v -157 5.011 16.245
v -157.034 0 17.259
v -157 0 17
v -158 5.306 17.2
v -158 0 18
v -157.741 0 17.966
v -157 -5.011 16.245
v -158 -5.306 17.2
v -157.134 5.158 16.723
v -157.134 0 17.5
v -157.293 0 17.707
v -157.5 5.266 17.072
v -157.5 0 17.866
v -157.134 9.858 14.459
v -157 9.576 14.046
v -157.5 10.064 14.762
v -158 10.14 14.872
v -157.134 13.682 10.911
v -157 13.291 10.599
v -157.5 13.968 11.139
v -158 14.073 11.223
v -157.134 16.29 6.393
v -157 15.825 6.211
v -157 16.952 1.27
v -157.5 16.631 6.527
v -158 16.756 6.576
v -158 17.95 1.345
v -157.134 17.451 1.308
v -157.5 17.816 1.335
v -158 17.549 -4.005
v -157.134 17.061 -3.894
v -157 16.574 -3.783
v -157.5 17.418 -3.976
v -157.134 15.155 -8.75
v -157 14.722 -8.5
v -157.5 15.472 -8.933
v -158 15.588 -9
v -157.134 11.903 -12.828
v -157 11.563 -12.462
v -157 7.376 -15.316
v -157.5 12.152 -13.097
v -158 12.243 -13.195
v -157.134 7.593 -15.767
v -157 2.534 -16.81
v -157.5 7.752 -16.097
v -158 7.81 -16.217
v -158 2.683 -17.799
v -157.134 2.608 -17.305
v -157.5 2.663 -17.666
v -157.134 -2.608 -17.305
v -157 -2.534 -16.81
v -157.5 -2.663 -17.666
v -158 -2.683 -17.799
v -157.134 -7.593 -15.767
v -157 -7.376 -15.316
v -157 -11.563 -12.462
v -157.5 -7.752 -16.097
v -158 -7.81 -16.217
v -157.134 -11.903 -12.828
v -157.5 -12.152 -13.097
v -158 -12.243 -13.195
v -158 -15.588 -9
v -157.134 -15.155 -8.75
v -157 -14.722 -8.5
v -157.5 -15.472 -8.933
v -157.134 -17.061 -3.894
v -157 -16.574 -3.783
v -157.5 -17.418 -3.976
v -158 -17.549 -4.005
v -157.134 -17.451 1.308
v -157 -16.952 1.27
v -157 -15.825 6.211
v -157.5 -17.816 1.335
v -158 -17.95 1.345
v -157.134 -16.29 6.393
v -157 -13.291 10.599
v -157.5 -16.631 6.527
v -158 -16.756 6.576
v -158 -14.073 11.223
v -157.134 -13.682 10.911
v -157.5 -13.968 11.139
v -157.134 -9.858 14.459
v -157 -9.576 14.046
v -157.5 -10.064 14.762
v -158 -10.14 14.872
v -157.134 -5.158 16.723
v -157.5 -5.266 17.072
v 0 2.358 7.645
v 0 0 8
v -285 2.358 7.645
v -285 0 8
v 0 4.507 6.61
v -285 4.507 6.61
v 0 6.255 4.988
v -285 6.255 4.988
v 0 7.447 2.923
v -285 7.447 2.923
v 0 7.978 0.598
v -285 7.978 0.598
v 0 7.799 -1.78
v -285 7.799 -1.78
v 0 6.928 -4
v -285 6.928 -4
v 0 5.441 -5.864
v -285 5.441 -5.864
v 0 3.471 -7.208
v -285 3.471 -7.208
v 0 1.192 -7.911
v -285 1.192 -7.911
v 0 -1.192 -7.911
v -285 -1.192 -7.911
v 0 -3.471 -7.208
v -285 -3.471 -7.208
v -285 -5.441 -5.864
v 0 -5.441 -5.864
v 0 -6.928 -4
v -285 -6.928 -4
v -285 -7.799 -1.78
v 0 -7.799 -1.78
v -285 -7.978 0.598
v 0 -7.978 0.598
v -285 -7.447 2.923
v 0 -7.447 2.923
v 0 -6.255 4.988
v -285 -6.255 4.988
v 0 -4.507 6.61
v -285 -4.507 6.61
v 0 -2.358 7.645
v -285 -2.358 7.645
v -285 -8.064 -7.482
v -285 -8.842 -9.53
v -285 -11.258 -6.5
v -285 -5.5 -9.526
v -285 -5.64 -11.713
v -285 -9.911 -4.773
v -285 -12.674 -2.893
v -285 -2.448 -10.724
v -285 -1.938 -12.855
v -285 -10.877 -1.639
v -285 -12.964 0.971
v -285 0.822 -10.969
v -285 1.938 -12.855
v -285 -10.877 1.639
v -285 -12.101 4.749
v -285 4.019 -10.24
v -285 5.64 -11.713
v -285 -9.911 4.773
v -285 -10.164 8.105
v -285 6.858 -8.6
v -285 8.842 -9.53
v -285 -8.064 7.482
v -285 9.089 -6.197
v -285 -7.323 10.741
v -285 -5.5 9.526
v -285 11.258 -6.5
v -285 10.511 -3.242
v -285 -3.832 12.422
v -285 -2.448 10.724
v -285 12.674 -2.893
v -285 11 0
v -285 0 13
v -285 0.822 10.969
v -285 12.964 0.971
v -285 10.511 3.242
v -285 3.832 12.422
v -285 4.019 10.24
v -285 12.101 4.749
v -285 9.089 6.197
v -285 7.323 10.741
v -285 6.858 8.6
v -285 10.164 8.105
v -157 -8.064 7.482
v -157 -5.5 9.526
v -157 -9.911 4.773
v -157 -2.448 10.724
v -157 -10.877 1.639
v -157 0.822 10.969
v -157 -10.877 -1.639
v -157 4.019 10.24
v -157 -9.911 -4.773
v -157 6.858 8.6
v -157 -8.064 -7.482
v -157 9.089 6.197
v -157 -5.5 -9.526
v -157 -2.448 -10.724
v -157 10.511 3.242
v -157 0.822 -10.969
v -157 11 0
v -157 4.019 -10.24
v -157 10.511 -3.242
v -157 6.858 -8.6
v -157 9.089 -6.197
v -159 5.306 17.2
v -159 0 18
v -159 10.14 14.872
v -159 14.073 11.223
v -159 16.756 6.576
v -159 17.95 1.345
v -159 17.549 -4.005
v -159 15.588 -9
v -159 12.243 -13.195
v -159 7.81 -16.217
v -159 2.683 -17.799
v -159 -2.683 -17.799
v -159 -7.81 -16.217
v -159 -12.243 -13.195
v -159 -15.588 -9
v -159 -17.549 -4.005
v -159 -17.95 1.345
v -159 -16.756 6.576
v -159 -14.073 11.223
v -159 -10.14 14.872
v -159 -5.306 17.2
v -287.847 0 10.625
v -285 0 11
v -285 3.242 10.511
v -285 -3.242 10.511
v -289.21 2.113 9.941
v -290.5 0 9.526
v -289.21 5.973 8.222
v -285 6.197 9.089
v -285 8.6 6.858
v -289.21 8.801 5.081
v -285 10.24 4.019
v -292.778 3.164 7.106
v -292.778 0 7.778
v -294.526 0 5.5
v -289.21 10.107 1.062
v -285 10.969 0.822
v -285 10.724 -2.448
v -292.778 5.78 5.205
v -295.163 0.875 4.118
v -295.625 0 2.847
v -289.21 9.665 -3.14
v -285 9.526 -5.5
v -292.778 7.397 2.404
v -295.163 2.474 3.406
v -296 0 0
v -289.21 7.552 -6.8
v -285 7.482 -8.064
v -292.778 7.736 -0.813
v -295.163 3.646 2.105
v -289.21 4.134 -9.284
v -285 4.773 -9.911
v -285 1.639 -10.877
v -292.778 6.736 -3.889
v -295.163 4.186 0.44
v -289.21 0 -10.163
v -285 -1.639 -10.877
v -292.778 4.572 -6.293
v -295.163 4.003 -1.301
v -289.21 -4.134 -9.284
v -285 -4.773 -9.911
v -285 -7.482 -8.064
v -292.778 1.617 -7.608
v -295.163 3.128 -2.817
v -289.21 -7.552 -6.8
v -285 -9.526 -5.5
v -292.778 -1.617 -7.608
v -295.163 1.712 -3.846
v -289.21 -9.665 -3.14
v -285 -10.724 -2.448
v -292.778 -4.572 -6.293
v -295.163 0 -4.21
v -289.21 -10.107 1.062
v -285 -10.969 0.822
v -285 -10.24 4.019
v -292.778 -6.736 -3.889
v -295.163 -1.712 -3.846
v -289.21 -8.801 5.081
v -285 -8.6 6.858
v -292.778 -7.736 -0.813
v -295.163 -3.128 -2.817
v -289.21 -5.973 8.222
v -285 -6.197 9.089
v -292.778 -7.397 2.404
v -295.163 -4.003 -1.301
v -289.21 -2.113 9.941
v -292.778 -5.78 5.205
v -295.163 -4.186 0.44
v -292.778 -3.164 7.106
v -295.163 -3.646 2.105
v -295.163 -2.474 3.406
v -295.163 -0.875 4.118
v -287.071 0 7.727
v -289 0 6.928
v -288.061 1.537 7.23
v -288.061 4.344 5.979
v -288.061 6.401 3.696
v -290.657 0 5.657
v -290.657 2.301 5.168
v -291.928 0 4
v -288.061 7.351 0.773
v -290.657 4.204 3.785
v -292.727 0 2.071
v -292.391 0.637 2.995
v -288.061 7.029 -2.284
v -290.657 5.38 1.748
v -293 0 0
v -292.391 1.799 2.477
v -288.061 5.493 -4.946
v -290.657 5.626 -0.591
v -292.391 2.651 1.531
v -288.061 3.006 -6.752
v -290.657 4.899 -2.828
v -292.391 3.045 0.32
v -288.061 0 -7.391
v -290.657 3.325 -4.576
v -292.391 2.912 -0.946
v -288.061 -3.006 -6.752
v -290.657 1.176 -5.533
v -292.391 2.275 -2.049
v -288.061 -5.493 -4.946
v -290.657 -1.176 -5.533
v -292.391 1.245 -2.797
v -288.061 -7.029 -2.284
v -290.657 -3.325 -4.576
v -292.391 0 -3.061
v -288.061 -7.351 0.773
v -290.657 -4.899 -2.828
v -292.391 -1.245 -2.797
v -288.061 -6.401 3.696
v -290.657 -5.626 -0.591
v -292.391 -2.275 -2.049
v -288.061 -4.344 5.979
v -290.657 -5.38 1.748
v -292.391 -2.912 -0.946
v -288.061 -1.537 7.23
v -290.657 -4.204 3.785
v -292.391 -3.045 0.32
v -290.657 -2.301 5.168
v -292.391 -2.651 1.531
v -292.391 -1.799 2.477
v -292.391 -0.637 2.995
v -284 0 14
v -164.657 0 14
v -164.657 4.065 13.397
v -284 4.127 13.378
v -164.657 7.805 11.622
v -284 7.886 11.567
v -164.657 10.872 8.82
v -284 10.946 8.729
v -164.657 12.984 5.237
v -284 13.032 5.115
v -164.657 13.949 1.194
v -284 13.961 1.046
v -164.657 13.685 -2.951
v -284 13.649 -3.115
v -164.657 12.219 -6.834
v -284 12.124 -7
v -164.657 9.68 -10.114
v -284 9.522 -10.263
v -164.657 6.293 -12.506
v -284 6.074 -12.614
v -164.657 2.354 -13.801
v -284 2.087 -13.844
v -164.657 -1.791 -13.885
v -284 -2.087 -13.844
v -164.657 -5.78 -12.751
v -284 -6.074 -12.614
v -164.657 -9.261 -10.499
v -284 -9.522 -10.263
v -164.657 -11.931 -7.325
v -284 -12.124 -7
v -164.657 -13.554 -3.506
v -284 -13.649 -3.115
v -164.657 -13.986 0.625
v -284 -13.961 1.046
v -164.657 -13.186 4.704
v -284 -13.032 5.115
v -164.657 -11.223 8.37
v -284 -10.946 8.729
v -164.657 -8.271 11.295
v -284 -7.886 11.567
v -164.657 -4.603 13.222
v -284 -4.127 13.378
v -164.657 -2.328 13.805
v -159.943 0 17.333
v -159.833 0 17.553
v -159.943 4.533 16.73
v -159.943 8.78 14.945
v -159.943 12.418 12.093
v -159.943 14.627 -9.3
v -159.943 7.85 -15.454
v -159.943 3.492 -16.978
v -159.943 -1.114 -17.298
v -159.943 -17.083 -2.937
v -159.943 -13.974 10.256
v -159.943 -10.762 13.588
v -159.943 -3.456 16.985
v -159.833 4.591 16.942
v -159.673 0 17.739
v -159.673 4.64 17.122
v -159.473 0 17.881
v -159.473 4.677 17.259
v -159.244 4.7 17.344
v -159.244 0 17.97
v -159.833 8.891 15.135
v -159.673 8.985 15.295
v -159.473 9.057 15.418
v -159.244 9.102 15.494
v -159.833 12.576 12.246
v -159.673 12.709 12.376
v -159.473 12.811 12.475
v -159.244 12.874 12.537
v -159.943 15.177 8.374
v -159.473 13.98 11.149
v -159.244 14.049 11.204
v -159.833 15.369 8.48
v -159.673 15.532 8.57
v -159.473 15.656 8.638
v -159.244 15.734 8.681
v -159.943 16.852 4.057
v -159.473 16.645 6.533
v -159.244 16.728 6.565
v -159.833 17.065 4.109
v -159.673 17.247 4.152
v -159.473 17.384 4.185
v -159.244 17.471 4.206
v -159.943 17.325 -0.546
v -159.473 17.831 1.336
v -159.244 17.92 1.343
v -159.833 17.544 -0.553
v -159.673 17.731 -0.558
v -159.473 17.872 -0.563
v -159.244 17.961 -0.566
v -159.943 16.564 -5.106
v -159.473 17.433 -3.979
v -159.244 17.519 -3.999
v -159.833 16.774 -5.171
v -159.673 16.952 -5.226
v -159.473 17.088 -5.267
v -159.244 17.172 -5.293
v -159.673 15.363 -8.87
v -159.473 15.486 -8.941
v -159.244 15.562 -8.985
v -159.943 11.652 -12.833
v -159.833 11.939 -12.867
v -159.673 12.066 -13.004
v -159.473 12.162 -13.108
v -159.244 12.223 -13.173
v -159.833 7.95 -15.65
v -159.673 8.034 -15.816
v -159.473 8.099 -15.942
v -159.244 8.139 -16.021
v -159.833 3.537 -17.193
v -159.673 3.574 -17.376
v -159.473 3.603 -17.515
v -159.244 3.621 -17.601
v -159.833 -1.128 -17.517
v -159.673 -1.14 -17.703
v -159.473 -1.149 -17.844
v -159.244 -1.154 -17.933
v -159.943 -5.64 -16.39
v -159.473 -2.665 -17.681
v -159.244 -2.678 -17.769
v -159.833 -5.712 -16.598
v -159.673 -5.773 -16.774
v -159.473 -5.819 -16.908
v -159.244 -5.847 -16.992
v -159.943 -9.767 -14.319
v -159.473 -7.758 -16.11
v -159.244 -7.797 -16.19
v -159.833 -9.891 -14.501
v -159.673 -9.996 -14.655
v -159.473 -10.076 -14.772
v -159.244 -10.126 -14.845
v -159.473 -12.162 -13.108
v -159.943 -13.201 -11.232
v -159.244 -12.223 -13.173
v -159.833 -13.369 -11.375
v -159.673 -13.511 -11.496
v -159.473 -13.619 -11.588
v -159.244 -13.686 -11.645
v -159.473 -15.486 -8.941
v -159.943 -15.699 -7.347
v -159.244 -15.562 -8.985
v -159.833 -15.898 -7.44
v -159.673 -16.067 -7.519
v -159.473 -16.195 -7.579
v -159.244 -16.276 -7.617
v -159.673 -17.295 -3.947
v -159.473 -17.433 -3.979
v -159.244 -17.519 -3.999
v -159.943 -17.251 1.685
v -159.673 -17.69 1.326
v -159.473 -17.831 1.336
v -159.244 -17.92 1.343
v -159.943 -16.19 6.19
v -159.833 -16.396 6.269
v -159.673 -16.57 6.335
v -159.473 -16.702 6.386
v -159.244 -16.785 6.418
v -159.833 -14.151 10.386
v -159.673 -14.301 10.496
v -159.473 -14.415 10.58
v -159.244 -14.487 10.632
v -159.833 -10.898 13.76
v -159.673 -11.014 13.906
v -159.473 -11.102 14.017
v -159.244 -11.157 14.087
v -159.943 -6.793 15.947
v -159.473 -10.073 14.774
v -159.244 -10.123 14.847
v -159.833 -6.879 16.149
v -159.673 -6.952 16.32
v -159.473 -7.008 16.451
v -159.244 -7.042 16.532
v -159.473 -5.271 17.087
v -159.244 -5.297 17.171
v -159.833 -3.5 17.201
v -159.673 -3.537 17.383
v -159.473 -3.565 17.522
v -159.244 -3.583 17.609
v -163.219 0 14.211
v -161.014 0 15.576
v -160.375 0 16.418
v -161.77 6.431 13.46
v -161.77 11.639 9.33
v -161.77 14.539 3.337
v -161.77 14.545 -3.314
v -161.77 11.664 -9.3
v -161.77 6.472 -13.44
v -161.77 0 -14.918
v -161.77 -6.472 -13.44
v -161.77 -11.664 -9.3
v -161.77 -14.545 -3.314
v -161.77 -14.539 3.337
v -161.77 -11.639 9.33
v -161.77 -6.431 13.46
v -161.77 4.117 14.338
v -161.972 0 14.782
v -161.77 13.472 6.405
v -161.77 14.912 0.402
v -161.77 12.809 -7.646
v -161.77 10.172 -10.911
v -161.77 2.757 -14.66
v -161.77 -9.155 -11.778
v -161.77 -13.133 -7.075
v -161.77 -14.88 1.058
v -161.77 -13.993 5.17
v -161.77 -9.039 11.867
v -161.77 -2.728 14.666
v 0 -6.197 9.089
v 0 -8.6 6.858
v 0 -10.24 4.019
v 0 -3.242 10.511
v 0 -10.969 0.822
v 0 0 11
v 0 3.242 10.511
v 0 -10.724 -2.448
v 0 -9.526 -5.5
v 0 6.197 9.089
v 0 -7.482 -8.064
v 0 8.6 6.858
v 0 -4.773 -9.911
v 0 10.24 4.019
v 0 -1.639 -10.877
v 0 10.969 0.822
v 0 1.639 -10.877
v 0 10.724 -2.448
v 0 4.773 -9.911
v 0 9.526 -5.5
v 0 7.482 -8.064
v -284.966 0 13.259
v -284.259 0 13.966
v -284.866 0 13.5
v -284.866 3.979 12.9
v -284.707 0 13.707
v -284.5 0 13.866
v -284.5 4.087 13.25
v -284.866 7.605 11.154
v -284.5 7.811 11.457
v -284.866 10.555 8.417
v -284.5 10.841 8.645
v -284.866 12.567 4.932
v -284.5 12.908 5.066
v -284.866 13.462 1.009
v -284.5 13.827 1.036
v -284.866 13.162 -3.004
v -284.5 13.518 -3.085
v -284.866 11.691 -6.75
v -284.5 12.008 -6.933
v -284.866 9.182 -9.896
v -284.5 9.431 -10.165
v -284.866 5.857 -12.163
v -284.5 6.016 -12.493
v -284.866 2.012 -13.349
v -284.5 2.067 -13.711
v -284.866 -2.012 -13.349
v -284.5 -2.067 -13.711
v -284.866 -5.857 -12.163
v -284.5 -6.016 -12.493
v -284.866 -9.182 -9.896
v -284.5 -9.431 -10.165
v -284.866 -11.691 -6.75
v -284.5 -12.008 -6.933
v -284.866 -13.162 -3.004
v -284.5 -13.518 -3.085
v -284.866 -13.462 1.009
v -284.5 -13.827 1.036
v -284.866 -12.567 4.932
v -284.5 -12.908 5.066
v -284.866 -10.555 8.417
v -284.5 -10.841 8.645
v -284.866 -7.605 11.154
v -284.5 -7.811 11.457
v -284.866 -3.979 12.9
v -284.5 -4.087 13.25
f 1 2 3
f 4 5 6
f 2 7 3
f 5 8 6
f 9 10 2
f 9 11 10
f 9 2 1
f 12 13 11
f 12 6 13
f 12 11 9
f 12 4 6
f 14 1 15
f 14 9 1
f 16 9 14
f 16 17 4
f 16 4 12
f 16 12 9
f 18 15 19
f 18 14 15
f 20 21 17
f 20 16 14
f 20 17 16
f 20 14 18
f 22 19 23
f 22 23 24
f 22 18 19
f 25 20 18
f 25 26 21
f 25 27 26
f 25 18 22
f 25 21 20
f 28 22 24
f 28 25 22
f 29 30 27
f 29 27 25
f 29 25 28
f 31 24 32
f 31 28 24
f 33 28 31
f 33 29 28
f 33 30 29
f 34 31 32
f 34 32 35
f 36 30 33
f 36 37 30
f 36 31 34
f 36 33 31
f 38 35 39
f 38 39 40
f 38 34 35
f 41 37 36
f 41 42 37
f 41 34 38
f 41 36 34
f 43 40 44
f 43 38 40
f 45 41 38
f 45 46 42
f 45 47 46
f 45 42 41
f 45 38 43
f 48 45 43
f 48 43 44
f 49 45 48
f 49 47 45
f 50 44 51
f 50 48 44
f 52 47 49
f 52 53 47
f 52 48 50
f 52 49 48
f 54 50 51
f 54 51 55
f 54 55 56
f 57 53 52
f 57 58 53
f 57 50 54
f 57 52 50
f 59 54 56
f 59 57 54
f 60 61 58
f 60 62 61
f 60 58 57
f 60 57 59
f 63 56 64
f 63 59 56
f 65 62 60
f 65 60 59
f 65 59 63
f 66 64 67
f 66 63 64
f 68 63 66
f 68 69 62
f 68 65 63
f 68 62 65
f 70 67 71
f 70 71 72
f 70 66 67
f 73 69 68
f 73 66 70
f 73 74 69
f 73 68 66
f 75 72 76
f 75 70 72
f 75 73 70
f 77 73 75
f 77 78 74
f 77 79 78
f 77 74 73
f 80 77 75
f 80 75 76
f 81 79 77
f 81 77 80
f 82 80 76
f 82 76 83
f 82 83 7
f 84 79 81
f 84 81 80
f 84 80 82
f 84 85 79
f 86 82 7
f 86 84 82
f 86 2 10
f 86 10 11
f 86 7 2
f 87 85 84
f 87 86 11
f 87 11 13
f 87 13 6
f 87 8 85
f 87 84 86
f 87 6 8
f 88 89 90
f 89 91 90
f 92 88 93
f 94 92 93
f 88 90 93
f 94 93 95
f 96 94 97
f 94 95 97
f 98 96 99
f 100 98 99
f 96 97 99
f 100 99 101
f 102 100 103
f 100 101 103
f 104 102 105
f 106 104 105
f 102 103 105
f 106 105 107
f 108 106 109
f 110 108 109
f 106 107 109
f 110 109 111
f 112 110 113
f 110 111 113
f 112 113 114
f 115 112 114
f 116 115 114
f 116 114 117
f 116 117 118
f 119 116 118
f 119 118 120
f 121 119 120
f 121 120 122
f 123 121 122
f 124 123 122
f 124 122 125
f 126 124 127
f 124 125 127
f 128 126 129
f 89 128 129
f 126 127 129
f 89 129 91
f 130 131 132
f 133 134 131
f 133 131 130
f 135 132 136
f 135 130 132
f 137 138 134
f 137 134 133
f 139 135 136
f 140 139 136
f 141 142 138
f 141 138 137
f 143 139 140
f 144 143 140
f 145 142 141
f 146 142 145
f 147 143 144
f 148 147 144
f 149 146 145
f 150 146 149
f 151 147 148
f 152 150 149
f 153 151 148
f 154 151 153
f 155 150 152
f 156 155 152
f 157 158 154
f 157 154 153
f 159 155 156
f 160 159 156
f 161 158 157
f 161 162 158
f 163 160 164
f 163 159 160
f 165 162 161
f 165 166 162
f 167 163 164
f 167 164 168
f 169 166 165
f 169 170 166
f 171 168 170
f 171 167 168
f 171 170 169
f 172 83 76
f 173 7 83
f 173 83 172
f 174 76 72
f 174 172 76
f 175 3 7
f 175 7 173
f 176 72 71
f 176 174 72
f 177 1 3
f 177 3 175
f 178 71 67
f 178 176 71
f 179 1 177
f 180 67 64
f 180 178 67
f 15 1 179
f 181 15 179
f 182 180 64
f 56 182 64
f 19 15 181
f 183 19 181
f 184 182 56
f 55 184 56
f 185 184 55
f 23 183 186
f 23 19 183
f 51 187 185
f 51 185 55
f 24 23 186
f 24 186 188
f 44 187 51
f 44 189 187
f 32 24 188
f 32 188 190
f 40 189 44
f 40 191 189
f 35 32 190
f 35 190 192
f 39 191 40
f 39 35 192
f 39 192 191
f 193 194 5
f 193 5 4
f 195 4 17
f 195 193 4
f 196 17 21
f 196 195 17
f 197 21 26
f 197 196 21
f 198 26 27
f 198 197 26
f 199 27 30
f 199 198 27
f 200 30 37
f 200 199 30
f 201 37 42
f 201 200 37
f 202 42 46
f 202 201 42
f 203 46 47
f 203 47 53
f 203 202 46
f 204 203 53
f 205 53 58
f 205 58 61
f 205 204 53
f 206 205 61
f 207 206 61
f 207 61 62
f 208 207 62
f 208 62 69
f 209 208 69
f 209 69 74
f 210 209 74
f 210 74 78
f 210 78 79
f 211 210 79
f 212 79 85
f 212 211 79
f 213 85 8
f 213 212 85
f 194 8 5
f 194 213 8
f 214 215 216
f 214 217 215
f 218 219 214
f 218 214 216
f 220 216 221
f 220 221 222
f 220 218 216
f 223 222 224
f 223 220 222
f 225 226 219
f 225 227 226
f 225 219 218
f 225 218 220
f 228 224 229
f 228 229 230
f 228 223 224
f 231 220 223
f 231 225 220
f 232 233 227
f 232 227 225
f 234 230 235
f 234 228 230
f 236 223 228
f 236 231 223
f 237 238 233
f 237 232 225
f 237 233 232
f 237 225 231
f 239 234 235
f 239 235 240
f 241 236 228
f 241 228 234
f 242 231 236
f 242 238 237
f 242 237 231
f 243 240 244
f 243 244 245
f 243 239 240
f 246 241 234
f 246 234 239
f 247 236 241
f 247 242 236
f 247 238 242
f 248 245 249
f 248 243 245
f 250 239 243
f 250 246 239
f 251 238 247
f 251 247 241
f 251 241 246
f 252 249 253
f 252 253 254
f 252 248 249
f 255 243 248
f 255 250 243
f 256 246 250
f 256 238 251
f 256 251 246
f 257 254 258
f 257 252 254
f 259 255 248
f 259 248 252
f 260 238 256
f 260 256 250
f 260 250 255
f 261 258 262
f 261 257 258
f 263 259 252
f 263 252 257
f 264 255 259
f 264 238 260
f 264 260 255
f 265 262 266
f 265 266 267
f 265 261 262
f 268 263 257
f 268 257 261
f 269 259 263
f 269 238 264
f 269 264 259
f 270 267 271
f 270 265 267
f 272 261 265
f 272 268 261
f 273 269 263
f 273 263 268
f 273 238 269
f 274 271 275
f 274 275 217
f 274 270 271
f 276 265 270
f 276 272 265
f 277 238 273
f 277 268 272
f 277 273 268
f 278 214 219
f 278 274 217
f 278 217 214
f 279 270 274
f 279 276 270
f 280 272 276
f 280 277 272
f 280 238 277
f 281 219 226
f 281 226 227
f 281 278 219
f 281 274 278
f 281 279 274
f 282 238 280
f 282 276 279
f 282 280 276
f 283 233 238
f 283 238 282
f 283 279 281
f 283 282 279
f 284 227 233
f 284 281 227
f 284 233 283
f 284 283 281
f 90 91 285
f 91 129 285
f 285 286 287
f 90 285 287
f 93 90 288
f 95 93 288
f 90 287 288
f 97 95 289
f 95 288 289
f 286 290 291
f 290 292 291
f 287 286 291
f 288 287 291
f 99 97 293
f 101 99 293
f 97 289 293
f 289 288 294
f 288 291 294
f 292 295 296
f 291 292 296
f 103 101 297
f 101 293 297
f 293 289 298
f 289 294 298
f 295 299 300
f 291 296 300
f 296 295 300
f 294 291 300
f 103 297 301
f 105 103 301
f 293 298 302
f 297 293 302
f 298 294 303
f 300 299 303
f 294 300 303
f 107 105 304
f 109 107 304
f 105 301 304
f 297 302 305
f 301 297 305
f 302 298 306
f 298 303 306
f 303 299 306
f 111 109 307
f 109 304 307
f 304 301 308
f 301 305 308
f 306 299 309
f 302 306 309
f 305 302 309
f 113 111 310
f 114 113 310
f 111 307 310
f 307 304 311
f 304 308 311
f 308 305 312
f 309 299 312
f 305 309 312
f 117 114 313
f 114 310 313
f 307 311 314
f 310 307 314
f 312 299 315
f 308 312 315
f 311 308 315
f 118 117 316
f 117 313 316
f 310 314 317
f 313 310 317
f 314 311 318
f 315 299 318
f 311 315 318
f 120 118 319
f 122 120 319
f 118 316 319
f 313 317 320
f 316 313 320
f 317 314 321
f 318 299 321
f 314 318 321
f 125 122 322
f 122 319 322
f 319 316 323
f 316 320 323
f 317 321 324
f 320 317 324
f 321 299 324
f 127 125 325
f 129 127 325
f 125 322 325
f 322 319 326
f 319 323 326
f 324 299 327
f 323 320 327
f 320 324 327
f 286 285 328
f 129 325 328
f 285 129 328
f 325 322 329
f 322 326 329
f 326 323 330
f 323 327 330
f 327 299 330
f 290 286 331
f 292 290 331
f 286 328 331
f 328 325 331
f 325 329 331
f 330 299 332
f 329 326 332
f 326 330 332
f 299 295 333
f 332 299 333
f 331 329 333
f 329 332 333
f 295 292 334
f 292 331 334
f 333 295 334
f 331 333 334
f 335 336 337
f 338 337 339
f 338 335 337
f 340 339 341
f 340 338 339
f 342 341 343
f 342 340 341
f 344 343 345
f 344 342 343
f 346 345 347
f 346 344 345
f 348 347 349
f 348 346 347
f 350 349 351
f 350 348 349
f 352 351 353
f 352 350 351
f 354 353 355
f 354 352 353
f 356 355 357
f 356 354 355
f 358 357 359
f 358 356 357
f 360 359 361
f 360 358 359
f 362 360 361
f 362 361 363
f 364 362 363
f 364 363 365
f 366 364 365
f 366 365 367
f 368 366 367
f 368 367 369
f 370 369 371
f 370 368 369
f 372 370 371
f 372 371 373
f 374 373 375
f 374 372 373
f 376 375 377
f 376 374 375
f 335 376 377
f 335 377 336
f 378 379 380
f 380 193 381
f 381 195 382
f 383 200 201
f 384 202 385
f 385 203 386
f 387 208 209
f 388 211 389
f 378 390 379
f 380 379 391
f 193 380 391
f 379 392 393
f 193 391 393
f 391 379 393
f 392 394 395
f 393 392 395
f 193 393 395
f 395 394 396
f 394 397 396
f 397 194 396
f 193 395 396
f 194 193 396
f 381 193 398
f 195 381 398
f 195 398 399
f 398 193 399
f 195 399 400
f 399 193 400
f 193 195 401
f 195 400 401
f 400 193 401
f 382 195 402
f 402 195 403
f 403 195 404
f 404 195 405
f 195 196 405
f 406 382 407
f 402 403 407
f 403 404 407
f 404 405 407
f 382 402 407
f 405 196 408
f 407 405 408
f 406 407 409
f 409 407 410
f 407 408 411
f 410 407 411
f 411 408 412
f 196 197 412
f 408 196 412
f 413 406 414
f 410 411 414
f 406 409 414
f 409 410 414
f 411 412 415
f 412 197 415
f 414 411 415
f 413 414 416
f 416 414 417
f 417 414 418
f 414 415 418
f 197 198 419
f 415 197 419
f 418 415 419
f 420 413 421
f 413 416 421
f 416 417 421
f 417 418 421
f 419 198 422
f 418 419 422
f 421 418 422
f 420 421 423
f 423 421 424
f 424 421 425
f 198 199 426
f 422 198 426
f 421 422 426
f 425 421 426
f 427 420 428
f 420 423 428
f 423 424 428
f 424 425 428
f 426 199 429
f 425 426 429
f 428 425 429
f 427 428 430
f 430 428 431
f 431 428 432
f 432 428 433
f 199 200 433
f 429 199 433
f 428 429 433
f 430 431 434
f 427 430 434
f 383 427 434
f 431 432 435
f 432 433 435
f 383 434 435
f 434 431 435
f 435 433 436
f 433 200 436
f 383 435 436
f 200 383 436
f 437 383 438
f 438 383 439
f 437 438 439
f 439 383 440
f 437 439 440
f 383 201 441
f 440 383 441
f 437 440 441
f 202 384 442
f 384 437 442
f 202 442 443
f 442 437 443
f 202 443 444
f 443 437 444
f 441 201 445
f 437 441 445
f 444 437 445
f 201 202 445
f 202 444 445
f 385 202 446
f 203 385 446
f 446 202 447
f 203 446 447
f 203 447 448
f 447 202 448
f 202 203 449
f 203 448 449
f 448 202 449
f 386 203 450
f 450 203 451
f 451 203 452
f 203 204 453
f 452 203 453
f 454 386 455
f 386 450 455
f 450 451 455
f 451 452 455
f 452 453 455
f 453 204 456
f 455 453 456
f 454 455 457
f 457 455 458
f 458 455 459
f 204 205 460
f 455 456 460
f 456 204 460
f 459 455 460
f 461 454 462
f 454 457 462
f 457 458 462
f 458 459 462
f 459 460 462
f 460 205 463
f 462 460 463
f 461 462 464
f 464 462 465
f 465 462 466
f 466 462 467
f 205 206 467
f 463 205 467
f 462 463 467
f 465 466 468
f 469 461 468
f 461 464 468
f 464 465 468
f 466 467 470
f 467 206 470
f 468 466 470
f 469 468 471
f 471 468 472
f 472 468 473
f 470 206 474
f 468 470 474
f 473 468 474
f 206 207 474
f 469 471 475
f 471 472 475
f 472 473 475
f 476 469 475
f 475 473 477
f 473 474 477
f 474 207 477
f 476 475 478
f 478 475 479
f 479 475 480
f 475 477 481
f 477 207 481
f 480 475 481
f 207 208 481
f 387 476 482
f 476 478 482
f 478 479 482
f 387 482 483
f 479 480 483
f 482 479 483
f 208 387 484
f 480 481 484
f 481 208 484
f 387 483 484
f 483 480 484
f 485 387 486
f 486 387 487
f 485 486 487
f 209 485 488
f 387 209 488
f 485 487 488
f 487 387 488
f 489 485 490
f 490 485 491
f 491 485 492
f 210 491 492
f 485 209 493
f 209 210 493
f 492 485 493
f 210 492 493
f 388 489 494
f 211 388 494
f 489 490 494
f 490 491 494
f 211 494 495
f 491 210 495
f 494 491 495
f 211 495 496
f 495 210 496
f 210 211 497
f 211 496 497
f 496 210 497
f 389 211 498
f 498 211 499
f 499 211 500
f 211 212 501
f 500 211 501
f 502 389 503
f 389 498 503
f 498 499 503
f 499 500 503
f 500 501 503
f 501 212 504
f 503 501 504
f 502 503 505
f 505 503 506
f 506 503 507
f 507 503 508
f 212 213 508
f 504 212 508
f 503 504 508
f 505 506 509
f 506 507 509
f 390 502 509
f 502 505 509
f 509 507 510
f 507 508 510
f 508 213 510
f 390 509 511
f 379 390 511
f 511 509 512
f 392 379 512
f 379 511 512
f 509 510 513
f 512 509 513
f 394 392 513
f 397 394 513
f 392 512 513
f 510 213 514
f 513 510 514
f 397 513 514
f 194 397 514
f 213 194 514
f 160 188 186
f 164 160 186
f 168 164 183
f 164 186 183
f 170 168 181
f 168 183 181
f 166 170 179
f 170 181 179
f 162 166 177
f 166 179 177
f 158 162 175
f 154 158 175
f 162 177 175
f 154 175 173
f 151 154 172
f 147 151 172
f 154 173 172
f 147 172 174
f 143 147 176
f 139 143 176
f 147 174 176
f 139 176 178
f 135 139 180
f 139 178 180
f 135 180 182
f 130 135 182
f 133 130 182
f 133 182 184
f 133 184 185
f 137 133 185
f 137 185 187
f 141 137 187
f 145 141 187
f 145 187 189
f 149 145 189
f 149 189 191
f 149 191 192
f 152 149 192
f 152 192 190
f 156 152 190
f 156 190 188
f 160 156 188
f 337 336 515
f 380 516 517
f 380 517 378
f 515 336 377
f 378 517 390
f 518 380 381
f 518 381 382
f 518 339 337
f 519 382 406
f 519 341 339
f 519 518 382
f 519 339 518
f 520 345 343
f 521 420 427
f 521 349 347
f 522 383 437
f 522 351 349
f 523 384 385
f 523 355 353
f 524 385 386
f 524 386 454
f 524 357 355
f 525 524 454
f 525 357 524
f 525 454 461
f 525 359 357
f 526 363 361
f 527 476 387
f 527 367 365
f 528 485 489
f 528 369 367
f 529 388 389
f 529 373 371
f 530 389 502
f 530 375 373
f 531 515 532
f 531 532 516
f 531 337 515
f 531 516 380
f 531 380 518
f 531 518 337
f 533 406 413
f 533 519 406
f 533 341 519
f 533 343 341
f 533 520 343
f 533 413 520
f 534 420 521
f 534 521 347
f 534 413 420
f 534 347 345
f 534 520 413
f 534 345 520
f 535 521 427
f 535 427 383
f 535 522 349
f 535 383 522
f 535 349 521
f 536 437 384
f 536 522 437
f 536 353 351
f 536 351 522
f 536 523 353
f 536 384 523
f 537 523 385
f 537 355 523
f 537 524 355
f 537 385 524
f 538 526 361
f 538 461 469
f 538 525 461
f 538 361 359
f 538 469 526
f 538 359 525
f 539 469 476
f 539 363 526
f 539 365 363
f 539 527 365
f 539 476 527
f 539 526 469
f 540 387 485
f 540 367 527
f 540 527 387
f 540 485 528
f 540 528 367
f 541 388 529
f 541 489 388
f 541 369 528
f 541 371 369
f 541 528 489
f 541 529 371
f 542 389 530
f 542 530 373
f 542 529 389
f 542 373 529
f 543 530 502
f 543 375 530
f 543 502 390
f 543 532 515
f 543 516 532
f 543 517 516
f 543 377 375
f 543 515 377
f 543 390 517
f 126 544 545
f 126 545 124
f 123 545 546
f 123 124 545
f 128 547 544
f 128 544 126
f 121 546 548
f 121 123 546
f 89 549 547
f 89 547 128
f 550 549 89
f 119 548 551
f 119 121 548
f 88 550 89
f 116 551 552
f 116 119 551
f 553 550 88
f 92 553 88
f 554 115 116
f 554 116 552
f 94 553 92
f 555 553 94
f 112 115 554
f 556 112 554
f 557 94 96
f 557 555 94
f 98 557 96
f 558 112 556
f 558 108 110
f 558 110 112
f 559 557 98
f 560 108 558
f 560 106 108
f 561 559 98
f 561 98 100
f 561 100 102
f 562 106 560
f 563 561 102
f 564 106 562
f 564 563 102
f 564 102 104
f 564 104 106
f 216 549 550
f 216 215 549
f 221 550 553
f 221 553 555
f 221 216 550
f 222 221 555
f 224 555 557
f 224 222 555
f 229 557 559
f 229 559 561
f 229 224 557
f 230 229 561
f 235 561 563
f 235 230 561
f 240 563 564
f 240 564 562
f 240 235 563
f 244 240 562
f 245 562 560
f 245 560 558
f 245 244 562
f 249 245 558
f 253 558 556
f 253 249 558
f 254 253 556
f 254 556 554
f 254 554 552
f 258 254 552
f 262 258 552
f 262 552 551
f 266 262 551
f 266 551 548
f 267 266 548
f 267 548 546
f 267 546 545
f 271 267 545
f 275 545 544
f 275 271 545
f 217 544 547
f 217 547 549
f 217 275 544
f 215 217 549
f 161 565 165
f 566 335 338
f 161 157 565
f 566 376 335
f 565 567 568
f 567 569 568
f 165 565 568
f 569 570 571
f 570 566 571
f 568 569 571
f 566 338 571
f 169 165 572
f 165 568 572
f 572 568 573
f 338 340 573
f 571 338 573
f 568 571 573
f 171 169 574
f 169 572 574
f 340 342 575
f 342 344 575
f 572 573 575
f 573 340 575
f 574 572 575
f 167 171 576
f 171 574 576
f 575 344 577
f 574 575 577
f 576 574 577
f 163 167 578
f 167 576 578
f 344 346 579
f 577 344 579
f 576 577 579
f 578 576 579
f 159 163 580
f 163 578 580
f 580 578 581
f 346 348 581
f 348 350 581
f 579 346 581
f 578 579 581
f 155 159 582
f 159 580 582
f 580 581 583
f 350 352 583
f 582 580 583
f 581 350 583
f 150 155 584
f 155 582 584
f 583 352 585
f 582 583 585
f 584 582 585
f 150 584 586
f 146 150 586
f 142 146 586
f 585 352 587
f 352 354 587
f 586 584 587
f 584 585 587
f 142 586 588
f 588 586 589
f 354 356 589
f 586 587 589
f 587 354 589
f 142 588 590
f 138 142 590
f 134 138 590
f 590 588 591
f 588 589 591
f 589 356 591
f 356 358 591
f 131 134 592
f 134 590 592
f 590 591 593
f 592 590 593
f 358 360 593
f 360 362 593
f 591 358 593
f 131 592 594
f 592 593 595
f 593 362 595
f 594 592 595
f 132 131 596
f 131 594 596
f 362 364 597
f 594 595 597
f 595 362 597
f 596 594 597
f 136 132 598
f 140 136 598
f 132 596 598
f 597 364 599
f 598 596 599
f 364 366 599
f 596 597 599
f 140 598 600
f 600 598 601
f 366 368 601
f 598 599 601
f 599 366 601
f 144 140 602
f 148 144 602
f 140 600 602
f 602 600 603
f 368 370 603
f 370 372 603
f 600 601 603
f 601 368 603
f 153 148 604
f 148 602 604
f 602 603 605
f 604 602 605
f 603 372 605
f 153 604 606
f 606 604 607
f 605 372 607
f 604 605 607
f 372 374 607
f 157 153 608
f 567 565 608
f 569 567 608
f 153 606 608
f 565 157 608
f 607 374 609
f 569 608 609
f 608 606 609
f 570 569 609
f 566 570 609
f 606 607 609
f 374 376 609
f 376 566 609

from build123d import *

# Parameters (mm, degrees)
F2_T     = -3
F5_R     = 11
F6_DEPTH = 139.001
F7_R     = 1
F8_R     = 5


with BuildPart() as f1:
    # F0 (on Front) → F1 (revolve)
    with BuildSketch(Plane.XZ):
        with BuildLine():
            Line((-296, 0), (0, 0))
            Line((0, 0), (0, 11))
            Line((0, 11), (-285, 11))
            ThreePointArc((-285, 11), (-292.7781745931, 7.7781745931), (-296, 0))
        make_face()
    revolve(axis=Axis((-148, 0, 0), (-1, 0, 0)))

    # F2
    f2_openings = [f1.faces().sort_by_distance(p)[0] for p in [
        (0, 0, 0),
    ]]
    offset(amount=F2_T, openings=f2_openings)


with BuildPart() as f4:
    # F3 (on Front) → F4 (revolve)
    with BuildSketch(Plane.XZ):
        Polygon((-285, 14), (-285, 0), (-157, 0), (-157, 18), (-160, 18), (-160, 14), align=None)
    revolve(axis=Axis((-221, 0, 0), (-1, 0, 0)))

    # F5 (on face) → F6 (cut, through all)
    with BuildSketch(Plane.YZ.offset(-157)):
        Circle(F5_R)
    extrude(amount=-F6_DEPTH, mode=Mode.SUBTRACT)

    # F7
    f7_edges = [f4.edges().sort_by_distance(p)[0] for p in [
        (-285, 0, -14),
        (-157, 0, -18),
        (-160, 0, -18),
        (-158.5, 0, 18),
    ]]
    fillet(f7_edges, radius=F7_R)

    # F8
    f8_edges = [f4.edges().sort_by_distance(p)[0] for p in [
        (-160, 0, -14),
    ]]
    fillet(f8_edges, radius=F8_R)


solid = Compound([f1.part, f4.part])
